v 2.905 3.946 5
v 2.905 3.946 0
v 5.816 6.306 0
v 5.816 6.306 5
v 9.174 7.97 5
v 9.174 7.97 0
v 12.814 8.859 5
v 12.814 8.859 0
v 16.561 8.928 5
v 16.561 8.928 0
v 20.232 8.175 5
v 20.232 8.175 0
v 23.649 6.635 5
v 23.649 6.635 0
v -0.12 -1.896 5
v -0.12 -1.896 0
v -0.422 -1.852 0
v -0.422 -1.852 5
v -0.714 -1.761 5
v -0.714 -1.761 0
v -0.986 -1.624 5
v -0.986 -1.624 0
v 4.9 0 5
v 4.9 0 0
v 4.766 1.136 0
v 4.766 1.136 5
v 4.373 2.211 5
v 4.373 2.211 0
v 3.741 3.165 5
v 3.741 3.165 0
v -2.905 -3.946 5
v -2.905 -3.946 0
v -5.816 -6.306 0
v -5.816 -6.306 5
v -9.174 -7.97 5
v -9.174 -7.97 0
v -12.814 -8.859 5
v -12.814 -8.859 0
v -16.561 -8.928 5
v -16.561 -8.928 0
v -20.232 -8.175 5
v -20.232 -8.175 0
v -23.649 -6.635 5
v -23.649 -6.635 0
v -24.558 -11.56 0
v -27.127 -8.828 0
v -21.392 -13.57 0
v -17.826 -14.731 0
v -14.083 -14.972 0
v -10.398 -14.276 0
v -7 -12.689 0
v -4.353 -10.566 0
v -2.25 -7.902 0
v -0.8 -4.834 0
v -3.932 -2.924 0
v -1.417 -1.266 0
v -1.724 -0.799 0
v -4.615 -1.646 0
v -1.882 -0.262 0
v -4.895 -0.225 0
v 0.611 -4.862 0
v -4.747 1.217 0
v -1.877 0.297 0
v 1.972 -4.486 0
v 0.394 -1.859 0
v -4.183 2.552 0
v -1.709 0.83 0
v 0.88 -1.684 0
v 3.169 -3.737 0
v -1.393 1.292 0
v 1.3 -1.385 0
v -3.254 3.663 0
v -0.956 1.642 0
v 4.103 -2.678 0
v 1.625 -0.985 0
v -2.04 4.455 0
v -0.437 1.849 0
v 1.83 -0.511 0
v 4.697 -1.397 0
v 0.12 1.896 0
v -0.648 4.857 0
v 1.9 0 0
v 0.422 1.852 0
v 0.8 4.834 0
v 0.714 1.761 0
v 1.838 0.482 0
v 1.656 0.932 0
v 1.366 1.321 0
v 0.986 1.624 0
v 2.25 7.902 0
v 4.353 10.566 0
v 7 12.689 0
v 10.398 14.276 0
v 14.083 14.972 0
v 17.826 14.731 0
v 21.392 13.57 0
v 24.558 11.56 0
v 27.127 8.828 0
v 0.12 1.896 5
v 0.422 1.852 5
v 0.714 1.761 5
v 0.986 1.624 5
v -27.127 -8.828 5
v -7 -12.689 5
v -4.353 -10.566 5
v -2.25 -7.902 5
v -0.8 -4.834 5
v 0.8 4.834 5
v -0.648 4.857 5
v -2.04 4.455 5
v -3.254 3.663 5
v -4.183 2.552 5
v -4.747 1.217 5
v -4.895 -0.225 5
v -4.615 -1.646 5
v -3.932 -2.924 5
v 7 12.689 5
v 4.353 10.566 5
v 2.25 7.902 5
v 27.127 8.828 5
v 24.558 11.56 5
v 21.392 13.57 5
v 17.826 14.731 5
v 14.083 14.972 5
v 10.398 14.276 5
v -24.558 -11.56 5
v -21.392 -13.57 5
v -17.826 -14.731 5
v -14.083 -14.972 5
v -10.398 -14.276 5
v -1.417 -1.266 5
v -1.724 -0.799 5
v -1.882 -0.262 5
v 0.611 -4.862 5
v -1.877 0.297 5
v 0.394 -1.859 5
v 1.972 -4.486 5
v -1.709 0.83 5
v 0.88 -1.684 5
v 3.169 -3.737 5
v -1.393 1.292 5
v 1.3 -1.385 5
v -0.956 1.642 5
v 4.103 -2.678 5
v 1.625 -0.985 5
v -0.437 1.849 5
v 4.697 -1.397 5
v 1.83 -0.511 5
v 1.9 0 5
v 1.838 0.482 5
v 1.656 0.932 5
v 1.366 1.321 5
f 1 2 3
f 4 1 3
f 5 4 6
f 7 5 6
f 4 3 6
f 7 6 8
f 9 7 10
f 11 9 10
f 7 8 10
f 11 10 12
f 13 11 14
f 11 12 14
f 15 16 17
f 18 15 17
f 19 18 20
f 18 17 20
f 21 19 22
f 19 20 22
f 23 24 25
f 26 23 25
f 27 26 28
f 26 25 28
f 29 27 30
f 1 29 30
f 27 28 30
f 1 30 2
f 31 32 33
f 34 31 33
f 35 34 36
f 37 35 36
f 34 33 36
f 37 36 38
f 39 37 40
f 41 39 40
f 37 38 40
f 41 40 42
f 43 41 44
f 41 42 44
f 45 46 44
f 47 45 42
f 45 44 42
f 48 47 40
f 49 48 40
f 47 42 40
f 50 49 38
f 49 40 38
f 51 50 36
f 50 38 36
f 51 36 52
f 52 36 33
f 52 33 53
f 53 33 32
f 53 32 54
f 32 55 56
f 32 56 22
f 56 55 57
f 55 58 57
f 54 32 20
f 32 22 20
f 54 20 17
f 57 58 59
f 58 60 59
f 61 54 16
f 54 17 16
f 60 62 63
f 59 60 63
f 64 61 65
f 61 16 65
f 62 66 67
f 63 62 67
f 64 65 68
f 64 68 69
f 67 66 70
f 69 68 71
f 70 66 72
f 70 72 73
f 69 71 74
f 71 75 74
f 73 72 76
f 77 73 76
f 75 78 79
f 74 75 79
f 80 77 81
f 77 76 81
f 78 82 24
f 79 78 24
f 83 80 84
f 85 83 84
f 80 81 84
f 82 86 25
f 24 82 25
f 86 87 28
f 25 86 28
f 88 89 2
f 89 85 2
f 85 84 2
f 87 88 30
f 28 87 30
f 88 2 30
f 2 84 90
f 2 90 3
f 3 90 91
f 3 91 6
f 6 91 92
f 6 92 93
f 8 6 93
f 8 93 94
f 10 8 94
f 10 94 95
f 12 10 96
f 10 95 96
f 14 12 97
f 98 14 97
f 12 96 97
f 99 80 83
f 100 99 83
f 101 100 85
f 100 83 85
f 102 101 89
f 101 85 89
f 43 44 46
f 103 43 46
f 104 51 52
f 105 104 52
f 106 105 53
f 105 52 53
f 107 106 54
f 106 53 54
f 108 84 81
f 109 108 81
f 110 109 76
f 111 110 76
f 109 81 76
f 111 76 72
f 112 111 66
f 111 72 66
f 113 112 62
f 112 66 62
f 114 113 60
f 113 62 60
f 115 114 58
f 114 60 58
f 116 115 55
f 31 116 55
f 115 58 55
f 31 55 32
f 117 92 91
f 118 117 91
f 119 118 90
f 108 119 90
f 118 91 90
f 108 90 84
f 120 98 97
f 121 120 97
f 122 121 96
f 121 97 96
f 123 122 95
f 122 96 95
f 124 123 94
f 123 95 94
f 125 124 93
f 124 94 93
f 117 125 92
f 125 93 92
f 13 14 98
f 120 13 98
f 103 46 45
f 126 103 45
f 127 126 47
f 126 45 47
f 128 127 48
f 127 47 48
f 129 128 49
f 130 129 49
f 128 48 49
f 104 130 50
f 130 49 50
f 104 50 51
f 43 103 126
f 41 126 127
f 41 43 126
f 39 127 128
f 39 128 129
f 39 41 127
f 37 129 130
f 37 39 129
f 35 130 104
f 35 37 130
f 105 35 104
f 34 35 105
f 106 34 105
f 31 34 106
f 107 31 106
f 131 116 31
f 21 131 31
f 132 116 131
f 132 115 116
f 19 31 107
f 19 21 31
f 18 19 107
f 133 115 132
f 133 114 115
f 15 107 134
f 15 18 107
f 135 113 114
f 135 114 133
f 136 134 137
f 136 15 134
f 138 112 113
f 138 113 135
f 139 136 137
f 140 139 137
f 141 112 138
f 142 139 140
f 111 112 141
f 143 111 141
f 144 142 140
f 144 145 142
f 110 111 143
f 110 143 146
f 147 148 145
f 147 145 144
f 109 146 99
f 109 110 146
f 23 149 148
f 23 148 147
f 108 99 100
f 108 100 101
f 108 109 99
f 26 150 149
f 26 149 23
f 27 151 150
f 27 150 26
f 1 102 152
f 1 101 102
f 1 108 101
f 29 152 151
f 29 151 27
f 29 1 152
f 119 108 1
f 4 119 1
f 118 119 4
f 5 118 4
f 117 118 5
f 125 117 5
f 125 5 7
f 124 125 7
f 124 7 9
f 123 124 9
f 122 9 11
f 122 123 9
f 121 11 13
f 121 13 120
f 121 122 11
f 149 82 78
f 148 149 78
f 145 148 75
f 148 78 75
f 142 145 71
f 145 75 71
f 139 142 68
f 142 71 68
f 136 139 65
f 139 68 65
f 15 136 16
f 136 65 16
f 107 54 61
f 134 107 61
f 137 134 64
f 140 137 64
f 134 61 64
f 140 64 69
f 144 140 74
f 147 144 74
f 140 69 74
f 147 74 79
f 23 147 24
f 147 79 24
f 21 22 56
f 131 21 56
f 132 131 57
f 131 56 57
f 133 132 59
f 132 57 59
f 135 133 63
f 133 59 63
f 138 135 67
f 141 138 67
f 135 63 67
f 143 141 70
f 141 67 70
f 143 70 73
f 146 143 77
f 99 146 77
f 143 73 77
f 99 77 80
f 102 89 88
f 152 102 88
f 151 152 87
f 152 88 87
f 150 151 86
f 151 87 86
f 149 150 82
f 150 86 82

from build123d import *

# Parameters (mm, degrees)
F1_DEPTH = 5


with BuildPart() as f1:
    # F0 (on Top) → F1 (new body)
    with BuildSketch(Plane.XY):
        with BuildLine():
            ThreePointArc((-7.0000001151, -12.688577613), (-3.2259131968, -9.2935934897), (-0.8003333333, -4.8341976124))
            ThreePointArc((-0.8003333333, -4.8341976124), (-1.9050962629, -4.5144887007), (-2.9049071205, -3.9460758509))
            ThreePointArc((-2.9049071205, -3.9460758509), (-12.814429581, -8.8589229177), (-23.6491115752, -6.635329479))
            Line((-23.6491115752, -6.635329479), (-27.1270159685, -8.8281075945))
            ThreePointArc((-27.1270159685, -8.8281075945), (-17.8255747432, -14.7314672511), (-7.0000001151, -12.688577613))
        make_face()
        with BuildLine():
            ThreePointArc((-0.8003333333, -4.8341976124), (-0.3863117112, -3.382323846), (-0.1203333333, -1.8961856156))
            ThreePointArc((-0.1203333333, -1.8961856156), (-0.5698724421, -1.8125245929), (-0.9864055845, -1.623885471))
            ThreePointArc((-0.9864055845, -1.623885471), (-1.8941223069, -2.8275560443), (-2.9049071205, -3.9460758509))
            ThreePointArc((-2.9049071205, -3.9460758509), (-1.9050962629, -4.5144887007), (-0.8003333333, -4.8341976124))
        make_face()
        with BuildLine():
            ThreePointArc((0.9864055845, 1.623885471), (1.6559243054, 0.9316193937), (1.9, 0))
            ThreePointArc((1.9, 0), (1.300262794, -1.3853940474), (-0.1203333333, -1.8961856156))
            ThreePointArc((-0.1203333333, -1.8961856156), (-0.3863117112, -3.382323846), (-0.8003333333, -4.8341976124))
            ThreePointArc((-0.8003333333, -4.8341976124), (3.1692559589, -3.737086655), (4.9, 0))
            ThreePointArc((4.9, 0), (4.3728734769, 2.2108771008), (2.9049071205, 3.9460758509))
            ThreePointArc((2.9049071205, 3.9460758509), (1.8941223069, 2.8275560443), (0.9864055845, 1.623885471))
        make_face()
        with BuildLine():
            ThreePointArc((-0.9864055845, -1.623885471), (-1.8125245929, 0.5698724421), (0.1203333333, 1.8961856156))
            ThreePointArc((0.1203333333, 1.8961856156), (0.3863117112, 3.382323846), (0.8003333333, 4.8341976124))
            ThreePointArc((0.8003333333, 4.8341976124), (-4.5144887007, 1.9050962629), (-2.9049071205, -3.9460758509))
            ThreePointArc((-2.9049071205, -3.9460758509), (-1.8941223069, -2.8275560443), (-0.9864055845, -1.623885471))
        make_face()
        with BuildLine():
            ThreePointArc((0.1203333333, 1.8961856156), (0.5698724421, 1.8125245929), (0.9864055845, 1.623885471))
            ThreePointArc((0.9864055845, 1.623885471), (1.8941223069, 2.8275560443), (2.9049071205, 3.9460758509))
            ThreePointArc((2.9049071205, 3.9460758509), (1.9050962629, 4.5144887007), (0.8003333333, 4.8341976124))
            ThreePointArc((0.8003333333, 4.8341976124), (0.3863117112, 3.382323846), (0.1203333333, 1.8961856156))
        make_face()
        with BuildLine():
            ThreePointArc((0.8003333333, 4.8341976124), (1.9050962629, 4.5144887007), (2.9049071205, 3.9460758509))
            ThreePointArc((2.9049071205, 3.9460758509), (12.814429581, 8.8589229177), (23.6491115752, 6.635329479))
            Line((23.6491115752, 6.635329479), (27.1270159685, 8.8281075945))
            ThreePointArc((27.1270159685, 8.8281075945), (17.8255747198, 14.7314672556), (7.0000000748, 12.6885775876))
            ThreePointArc((7.0000000748, 12.6885775876), (3.225913182, 9.2935934709), (0.8003333333, 4.8341976124))
        make_face()
    extrude(amount=F1_DEPTH)


solid = f1.part
